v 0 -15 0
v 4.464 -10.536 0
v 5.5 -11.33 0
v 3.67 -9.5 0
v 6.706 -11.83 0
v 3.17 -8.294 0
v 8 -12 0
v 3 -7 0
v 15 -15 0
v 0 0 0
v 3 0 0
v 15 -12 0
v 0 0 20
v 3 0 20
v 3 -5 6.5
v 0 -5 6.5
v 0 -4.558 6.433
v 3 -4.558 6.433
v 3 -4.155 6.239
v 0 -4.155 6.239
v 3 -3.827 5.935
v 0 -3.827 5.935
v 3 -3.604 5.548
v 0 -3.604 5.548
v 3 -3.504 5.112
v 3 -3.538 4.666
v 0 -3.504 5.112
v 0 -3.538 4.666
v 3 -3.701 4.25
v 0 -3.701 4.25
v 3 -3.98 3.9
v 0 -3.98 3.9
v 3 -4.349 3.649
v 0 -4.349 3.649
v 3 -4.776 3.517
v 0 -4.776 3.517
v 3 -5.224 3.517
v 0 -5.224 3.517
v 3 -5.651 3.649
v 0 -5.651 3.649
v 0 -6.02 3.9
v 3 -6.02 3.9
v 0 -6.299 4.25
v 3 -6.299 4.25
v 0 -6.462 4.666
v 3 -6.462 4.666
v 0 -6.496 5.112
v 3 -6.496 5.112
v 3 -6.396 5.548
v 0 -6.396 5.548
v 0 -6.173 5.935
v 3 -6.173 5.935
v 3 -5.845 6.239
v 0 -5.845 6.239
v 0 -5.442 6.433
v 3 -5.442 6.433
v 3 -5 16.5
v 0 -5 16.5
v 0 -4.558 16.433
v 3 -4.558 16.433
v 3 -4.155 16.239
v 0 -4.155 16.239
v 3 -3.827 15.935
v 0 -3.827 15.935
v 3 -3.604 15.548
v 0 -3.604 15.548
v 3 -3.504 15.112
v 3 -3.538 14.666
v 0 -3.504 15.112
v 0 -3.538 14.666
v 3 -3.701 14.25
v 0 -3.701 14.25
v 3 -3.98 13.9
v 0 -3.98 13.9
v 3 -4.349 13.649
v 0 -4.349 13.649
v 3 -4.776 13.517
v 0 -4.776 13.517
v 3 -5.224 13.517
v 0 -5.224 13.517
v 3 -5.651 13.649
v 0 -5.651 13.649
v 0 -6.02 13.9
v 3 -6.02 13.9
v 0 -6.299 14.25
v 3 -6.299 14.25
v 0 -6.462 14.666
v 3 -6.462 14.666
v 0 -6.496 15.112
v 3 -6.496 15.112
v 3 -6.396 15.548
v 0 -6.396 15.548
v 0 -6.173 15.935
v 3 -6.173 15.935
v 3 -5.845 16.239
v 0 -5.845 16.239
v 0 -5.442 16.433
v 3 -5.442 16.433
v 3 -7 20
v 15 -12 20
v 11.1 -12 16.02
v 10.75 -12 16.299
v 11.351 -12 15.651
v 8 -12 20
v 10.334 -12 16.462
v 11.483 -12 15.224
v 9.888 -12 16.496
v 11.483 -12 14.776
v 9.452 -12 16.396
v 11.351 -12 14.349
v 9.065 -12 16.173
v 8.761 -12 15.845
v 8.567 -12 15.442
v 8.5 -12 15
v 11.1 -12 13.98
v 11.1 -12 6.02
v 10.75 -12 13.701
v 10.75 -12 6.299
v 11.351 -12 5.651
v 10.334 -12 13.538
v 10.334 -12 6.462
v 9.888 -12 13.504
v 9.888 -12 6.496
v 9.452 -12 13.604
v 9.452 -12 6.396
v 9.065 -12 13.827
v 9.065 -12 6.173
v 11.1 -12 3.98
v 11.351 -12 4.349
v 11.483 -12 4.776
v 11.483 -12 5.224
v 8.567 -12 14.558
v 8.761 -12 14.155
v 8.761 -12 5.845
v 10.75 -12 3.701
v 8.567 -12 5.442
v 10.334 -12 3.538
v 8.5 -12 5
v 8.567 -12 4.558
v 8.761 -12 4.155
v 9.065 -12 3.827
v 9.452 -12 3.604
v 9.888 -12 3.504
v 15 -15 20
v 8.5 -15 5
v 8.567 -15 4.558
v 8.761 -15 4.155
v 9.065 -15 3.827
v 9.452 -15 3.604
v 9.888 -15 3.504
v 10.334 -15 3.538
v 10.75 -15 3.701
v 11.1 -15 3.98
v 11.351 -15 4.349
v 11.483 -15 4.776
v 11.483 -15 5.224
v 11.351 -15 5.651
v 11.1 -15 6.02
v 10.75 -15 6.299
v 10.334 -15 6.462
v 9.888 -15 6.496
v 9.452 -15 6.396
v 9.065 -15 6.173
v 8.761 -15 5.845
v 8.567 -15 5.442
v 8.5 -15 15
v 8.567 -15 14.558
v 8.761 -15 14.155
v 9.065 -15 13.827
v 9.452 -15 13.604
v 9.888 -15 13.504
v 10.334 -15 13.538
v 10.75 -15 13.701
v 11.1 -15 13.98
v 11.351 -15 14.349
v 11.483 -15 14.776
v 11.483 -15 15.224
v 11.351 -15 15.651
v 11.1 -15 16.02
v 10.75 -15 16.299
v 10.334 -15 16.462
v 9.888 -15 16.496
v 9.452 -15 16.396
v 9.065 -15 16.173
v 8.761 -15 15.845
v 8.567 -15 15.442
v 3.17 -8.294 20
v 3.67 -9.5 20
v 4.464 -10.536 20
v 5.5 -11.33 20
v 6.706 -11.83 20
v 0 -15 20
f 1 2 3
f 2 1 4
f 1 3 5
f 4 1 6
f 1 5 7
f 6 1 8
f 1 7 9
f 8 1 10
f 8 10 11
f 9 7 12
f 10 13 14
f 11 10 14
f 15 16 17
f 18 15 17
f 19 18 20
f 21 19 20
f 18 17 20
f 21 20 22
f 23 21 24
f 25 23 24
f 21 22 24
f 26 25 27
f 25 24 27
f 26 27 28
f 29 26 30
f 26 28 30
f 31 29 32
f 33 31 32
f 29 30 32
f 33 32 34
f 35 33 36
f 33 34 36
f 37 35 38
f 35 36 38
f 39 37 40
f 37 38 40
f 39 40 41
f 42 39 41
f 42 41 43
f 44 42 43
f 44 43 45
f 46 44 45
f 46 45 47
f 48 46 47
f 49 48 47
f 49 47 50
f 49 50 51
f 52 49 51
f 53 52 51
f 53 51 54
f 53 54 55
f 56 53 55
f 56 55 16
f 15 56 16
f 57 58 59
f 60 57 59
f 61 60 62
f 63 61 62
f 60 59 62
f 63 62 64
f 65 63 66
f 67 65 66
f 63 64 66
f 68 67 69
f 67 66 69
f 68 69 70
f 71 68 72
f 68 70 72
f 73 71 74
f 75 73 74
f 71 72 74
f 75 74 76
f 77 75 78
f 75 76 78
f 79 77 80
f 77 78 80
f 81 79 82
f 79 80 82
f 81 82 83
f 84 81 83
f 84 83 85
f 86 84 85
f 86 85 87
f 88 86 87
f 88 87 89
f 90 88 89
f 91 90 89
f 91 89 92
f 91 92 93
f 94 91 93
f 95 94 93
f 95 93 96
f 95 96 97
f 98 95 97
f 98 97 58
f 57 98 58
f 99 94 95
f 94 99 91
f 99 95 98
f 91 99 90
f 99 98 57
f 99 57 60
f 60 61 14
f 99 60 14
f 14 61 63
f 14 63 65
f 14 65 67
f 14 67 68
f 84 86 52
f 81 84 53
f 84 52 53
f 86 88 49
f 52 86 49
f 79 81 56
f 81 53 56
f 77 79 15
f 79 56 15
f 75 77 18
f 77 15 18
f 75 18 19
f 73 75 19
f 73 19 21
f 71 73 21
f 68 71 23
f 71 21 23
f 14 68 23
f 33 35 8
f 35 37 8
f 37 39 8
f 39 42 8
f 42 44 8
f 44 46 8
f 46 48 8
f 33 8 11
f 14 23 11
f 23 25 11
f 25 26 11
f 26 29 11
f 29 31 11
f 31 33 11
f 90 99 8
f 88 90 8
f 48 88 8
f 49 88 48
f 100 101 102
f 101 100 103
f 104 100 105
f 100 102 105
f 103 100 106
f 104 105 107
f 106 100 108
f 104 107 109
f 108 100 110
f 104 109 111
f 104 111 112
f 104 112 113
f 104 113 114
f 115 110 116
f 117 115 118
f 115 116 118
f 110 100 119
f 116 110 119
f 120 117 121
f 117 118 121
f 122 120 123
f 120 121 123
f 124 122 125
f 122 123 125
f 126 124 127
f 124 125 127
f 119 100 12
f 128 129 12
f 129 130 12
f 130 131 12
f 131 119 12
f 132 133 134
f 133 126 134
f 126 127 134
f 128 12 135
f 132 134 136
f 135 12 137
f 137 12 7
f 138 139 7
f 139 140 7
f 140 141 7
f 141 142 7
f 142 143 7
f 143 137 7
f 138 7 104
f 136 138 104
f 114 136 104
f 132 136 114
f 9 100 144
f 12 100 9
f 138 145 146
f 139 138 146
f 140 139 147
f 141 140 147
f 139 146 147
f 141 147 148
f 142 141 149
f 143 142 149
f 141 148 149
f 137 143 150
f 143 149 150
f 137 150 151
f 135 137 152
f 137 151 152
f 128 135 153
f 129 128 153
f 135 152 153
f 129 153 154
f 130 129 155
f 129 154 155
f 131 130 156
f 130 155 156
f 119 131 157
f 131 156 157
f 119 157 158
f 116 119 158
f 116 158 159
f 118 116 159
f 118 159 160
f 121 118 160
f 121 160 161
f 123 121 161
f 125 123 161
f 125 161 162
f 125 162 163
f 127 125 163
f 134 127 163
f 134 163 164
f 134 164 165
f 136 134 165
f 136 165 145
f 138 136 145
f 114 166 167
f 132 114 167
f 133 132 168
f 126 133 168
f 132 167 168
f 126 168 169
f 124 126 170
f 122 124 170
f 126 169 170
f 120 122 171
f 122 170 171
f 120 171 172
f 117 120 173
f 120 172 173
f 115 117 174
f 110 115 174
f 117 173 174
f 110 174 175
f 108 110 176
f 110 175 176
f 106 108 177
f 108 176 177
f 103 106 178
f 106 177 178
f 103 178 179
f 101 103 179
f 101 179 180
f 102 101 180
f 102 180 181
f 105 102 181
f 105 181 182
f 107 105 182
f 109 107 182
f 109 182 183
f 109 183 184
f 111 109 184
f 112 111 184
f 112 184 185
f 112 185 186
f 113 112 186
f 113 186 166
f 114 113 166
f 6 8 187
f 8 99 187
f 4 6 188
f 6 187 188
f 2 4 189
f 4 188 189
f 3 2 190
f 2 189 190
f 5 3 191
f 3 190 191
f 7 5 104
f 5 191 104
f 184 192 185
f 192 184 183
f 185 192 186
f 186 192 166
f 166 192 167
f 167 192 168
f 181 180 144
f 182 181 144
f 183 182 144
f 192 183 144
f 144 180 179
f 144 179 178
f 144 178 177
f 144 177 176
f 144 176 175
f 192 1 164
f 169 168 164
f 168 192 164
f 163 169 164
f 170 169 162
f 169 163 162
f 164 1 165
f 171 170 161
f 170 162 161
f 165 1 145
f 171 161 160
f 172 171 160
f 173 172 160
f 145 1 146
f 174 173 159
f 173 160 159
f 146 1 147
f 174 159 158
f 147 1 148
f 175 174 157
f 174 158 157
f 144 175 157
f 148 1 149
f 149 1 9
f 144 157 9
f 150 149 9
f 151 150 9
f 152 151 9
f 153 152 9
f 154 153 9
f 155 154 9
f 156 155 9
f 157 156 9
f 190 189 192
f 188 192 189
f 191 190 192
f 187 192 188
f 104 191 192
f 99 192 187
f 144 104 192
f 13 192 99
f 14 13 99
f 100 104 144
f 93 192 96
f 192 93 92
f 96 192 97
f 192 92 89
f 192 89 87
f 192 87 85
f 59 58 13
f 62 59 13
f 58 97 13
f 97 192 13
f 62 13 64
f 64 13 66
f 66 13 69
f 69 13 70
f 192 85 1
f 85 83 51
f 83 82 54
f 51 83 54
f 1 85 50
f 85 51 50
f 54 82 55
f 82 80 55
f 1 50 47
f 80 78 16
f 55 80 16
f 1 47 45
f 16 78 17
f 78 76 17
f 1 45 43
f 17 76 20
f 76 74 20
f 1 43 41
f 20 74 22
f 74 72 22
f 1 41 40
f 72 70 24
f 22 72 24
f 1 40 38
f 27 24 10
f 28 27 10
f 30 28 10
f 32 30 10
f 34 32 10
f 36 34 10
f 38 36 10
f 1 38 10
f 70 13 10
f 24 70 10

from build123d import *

# Parameters (mm, degrees)
SKETCH_1_W            = 15
SKETCH_1_H            = 20
EXTRUDE_1_DEPTH       = 15
SKETCH_2_W            = 12
SKETCH_2_H            = 12
CUT_EXTRUDE_1_DEPTH   = 30.154759474
HOLE_WIZARD_3_0_3_1_D = 3
HOLE_WIZARD_3_0_3_2_D = 3
FILLET_1_R            = 5


with BuildPart() as part:
    # 草图1 → 凸台-拉伸1 (new body)
    with BuildSketch(Plane(origin=(0, 0, 0), x_dir=(1, 0, 0), z_dir=(0, 1, 0))):
        with Locations((7.5, -10)):
            Rectangle(SKETCH_1_W, SKETCH_1_H)
    extrude(amount=-EXTRUDE_1_DEPTH)

    # 草图2 → 切除-拉伸1 (cut, through all)
    with BuildSketch(Plane(origin=(0, 0, 0), x_dir=(-1, 0, 0), z_dir=(0, 0, -1))):
        with Locations((-9, -6)):
            Rectangle(SKETCH_2_W, SKETCH_2_H)
    extrude(amount=-CUT_EXTRUDE_1_DEPTH, mode=Mode.SUBTRACT)

    # Ø3.0 (3) 直径孔1 (through all)
    with Locations(Plane(origin=(3, 0, 0), x_dir=(0, 0, -1), z_dir=(1, 0, 0))):
        with Locations((-5, -5), (-15, -5)):
            Hole(HOLE_WIZARD_3_0_3_1_D / 2)

    # Ø3.0 (3) 直径孔2 (through all)
    with Locations(Plane(origin=(0, -12, 0), x_dir=(1, 0, 0), z_dir=(0, 1, 0))):
        with Locations((10, -5), (10, -15)):
            Hole(HOLE_WIZARD_3_0_3_2_D / 2)

    # 圆角1
    fillet_1_edges = [part.edges().sort_by_distance(p)[0] for p in [
        (3, -12, 10),
    ]]
    fillet(fillet_1_edges, radius=FILLET_1_R)


solid = part.part
